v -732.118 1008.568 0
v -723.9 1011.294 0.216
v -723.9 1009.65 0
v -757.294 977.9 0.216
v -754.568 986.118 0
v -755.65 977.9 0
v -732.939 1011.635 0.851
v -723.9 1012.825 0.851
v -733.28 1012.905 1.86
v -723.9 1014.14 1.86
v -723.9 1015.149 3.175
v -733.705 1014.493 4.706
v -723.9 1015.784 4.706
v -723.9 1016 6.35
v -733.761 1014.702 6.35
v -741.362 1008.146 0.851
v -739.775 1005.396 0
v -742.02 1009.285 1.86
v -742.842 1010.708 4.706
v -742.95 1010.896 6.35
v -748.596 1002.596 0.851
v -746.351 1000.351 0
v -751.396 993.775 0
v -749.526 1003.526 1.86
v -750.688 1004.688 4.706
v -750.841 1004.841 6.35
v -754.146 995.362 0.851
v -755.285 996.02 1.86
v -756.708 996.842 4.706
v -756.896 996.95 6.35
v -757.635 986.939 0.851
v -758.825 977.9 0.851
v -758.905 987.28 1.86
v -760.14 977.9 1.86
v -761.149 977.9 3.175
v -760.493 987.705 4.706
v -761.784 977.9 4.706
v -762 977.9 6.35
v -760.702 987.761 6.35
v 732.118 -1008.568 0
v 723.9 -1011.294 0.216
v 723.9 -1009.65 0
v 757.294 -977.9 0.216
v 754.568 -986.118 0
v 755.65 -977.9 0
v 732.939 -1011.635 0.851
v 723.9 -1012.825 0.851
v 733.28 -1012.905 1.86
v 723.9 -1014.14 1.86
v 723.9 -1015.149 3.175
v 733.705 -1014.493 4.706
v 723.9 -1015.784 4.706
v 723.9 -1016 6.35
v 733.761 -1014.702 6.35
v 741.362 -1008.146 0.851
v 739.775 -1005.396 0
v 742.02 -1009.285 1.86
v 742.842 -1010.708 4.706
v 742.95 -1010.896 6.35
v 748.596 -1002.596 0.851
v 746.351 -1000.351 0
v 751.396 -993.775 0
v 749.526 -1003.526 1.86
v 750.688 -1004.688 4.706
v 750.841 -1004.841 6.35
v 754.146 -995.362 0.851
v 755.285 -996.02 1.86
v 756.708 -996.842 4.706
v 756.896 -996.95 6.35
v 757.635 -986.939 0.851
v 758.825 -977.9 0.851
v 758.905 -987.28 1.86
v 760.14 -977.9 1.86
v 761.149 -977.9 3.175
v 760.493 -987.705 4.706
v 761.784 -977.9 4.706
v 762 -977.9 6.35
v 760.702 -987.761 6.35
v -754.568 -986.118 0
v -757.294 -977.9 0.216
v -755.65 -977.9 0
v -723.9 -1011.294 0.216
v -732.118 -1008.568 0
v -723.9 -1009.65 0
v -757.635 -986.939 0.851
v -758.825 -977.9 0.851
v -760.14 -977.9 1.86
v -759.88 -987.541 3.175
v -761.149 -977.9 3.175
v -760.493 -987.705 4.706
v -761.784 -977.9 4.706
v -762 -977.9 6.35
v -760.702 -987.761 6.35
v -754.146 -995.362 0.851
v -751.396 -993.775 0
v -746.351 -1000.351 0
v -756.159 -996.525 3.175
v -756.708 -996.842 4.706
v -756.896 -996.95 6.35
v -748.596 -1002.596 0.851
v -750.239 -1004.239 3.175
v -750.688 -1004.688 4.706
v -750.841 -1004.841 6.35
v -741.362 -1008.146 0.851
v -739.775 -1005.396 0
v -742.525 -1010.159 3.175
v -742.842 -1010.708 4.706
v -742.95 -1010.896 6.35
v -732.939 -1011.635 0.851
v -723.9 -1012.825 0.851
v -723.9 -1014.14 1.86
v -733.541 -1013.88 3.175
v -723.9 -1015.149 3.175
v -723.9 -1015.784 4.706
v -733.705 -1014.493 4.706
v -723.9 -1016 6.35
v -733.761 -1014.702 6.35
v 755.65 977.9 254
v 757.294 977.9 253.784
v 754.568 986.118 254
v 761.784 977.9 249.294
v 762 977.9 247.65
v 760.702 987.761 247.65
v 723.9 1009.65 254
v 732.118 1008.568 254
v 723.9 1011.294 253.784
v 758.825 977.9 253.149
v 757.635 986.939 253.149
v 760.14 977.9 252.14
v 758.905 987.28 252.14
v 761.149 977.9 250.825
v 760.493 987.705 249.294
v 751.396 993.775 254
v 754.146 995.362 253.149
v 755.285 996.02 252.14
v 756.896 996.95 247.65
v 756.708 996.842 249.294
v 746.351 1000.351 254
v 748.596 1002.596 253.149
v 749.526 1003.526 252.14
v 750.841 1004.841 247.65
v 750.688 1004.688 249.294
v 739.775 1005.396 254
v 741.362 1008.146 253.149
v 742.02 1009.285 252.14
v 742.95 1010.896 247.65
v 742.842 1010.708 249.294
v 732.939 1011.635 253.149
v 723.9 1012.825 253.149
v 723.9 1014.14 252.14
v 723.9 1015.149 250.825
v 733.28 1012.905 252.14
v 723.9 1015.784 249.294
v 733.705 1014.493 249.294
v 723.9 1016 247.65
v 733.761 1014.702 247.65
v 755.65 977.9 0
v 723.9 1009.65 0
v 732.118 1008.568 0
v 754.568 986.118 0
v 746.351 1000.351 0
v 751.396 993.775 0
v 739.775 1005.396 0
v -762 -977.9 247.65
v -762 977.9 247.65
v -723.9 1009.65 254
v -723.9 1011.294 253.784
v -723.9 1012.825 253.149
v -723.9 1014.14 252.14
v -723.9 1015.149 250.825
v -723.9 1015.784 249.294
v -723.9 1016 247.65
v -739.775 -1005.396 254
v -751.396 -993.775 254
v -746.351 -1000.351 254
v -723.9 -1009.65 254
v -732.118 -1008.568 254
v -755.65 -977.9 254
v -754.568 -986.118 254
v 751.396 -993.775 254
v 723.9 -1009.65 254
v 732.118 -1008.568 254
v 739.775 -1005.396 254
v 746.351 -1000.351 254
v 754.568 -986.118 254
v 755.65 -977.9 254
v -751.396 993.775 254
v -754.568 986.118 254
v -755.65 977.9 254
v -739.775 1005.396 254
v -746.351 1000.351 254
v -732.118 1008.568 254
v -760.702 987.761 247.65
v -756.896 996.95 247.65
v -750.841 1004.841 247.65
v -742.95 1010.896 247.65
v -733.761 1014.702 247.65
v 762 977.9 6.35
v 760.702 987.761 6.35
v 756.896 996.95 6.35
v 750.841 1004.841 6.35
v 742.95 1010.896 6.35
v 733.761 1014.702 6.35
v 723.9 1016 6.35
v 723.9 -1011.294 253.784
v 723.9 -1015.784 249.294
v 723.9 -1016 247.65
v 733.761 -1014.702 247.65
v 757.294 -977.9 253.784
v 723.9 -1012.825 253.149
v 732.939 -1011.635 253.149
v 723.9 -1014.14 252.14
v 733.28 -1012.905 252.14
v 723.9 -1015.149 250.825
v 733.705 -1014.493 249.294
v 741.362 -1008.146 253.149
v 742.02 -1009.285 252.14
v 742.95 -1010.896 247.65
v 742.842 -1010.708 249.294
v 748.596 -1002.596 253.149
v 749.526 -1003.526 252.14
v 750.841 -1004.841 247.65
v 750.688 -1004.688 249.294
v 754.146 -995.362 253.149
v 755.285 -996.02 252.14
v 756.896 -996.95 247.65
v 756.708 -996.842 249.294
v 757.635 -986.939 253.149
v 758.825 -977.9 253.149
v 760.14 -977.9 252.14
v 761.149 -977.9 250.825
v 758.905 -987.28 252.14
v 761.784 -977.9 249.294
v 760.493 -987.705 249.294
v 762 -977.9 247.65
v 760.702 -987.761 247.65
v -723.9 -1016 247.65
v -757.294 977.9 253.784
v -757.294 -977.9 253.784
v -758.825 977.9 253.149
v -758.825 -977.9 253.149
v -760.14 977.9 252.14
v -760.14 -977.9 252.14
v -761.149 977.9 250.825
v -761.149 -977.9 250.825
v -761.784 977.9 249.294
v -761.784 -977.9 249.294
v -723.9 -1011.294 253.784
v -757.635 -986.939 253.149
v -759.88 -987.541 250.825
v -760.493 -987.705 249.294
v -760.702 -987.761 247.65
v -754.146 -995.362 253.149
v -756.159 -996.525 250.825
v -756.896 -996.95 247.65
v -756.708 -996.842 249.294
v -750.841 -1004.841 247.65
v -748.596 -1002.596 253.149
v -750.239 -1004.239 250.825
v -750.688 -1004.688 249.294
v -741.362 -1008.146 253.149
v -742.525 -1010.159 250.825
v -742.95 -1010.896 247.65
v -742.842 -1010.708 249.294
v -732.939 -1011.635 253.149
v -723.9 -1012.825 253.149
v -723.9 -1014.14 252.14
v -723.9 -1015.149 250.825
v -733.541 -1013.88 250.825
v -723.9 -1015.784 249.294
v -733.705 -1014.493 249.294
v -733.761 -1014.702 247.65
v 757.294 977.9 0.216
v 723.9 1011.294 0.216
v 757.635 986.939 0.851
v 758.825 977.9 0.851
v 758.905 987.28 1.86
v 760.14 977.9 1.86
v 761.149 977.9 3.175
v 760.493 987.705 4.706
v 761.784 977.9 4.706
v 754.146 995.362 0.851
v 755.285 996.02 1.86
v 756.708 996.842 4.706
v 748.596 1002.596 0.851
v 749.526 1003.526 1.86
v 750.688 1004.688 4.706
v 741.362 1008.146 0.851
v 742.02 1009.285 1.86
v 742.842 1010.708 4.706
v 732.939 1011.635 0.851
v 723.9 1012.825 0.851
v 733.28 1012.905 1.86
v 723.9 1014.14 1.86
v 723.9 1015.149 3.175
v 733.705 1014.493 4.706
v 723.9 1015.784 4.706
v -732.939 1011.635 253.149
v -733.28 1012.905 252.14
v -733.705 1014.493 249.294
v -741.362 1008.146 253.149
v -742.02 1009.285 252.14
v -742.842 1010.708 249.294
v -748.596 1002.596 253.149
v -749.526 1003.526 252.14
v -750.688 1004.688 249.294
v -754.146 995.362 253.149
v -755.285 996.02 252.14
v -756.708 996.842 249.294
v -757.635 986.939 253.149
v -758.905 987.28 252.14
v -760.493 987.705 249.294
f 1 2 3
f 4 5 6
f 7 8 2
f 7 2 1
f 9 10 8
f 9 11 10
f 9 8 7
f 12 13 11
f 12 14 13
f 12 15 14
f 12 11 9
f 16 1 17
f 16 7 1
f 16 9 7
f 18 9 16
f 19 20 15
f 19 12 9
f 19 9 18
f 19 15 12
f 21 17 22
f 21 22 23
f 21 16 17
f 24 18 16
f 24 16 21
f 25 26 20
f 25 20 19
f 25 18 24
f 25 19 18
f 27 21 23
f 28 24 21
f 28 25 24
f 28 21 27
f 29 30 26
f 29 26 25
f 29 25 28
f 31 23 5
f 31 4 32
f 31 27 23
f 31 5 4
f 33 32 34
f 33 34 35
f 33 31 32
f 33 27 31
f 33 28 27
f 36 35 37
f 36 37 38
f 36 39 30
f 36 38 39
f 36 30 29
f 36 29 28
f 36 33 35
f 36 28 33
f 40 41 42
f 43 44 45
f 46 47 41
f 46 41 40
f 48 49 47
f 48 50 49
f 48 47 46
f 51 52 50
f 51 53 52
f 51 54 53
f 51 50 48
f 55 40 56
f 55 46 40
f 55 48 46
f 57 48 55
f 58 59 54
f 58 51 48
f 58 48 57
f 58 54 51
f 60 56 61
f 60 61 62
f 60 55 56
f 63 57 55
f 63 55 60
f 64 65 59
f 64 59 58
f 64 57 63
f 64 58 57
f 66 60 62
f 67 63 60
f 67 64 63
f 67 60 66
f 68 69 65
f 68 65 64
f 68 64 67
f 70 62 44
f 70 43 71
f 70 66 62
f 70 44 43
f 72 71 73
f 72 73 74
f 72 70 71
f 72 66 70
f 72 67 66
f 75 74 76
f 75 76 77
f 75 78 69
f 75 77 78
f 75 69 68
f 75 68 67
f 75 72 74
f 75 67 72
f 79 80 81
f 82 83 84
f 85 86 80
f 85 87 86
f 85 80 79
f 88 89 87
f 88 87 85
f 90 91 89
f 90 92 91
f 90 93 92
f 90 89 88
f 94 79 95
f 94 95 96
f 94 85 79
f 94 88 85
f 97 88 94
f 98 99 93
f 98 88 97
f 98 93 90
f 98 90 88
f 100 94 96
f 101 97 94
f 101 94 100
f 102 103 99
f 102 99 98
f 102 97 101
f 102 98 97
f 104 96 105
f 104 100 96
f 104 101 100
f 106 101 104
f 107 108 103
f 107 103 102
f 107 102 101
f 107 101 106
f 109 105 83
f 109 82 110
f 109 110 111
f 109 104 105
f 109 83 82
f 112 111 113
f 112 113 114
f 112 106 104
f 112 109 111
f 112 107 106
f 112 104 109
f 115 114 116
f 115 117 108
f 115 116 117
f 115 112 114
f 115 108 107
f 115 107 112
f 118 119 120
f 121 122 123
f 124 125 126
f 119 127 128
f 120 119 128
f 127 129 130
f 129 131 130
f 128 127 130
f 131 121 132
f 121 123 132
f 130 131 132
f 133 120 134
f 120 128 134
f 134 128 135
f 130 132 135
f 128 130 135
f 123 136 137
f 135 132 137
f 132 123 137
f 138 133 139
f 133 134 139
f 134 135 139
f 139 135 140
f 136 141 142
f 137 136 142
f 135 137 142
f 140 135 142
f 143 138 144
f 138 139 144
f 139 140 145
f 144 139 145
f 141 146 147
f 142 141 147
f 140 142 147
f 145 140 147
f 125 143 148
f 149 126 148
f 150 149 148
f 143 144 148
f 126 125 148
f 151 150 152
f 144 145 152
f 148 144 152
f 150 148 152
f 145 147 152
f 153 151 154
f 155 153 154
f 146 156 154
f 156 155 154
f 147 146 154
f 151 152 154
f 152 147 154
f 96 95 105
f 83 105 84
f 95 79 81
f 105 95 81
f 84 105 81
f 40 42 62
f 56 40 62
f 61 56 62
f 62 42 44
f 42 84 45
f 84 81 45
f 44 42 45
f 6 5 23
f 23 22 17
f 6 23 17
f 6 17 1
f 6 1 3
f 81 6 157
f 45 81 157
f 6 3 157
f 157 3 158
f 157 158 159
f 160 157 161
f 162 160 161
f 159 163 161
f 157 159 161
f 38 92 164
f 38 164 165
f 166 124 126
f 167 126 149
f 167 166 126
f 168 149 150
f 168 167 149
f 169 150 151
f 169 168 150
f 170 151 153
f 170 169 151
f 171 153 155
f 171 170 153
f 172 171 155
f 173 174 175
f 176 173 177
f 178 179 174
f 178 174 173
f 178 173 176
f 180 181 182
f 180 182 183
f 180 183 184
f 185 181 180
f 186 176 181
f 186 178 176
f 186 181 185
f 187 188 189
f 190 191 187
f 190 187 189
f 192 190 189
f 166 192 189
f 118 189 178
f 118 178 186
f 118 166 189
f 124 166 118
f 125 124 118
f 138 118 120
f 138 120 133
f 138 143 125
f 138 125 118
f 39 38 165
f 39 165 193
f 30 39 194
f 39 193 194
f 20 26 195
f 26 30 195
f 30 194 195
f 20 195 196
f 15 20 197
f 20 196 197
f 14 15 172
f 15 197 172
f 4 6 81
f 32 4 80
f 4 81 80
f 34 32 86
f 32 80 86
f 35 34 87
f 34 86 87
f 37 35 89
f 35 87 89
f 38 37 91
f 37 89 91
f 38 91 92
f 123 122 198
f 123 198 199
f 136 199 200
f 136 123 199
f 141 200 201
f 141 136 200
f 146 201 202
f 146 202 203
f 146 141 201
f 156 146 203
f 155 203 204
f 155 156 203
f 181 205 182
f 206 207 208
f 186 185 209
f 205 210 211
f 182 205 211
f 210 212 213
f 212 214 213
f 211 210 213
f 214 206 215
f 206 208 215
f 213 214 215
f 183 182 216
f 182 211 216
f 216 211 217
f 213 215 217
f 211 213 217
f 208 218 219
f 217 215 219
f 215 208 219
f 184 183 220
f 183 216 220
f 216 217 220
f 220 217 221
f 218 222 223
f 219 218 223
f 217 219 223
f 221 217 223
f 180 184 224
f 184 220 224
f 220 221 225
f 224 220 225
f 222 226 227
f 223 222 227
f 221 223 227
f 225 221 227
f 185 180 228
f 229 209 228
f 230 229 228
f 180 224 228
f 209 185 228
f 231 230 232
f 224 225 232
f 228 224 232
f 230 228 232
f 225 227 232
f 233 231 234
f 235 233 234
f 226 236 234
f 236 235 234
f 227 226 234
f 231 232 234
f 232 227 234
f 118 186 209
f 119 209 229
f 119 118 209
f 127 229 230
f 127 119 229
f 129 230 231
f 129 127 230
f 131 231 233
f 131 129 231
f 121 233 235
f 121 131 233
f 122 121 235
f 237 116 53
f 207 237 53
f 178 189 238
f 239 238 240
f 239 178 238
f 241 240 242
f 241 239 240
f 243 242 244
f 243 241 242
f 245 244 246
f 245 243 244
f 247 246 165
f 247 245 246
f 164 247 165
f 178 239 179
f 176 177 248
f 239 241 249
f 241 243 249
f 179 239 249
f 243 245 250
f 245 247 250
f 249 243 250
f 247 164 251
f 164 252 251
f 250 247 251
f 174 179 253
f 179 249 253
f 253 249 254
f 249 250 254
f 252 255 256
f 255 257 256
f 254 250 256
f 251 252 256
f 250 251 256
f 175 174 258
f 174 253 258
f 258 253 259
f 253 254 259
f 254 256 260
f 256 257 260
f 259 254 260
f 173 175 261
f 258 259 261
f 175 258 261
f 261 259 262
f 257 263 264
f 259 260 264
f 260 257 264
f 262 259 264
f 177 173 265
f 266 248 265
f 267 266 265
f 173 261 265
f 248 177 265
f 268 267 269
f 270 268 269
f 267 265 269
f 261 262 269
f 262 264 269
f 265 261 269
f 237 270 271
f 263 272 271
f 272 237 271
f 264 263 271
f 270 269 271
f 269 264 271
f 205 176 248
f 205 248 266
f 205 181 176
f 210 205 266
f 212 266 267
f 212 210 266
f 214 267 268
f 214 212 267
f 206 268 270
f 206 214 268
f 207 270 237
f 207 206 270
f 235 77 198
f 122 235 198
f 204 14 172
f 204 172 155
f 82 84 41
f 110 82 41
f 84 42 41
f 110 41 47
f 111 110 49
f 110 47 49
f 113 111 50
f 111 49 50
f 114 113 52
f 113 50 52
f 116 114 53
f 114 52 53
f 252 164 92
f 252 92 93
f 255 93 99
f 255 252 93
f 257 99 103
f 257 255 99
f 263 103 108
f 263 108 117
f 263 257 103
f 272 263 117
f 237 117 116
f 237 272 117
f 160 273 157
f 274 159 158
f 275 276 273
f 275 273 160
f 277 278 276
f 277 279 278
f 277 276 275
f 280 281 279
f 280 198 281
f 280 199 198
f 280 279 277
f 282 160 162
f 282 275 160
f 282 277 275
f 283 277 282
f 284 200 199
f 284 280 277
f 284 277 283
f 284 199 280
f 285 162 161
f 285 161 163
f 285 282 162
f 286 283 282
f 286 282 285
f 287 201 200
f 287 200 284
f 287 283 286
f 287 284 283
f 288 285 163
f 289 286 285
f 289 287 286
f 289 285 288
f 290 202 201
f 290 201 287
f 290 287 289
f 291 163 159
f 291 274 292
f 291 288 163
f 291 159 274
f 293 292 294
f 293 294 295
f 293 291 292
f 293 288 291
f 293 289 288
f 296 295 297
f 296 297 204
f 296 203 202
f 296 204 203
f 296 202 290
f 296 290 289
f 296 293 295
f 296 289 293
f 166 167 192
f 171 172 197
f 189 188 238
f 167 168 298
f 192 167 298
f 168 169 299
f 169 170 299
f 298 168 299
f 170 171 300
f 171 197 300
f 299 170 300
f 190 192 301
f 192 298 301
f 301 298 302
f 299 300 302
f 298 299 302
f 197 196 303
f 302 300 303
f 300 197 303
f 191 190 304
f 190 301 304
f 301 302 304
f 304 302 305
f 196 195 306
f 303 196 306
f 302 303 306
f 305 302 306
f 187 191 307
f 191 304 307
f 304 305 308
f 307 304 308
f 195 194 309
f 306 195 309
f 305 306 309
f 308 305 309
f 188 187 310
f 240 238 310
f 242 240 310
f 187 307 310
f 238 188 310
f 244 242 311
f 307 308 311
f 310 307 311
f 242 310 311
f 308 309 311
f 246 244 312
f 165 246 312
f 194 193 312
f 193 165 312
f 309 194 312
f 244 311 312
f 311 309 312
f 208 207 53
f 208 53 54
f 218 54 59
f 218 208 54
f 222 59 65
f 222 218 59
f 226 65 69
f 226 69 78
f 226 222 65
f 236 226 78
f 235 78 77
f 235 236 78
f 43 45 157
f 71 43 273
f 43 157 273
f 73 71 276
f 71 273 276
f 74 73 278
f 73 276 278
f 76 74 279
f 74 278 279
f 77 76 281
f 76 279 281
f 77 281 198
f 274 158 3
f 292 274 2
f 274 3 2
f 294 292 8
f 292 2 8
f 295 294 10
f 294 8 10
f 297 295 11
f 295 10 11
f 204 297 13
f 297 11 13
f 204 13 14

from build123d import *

# Parameters (mm, degrees)
F0_W     = 1524
F0_H     = 2032
F1_DEPTH = 254
F2_R     = 38.1
F3_R     = 6.35


with BuildPart() as f1:
    # F0 (on Top) → F1 (new body)
    with BuildSketch(Plane.XY):
        Rectangle(F0_W, F0_H)
    extrude(amount=F1_DEPTH)

    # F2
    f2_edges = [f1.edges().sort_by_distance(p)[0] for p in [
        (-762, -1016, 127),
        (762, -1016, 127),
        (762, 1016, 127),
        (-762, 1016, 127),
    ]]
    fillet(f2_edges, radius=F2_R)

    # F3
    f3_edges = [f1.edges().sort_by_distance(p)[0] for p in [
        (0, -1016, 254),
        (0, -1016, 0),
    ]]
    fillet(f3_edges, radius=F3_R)


solid = f1.part
